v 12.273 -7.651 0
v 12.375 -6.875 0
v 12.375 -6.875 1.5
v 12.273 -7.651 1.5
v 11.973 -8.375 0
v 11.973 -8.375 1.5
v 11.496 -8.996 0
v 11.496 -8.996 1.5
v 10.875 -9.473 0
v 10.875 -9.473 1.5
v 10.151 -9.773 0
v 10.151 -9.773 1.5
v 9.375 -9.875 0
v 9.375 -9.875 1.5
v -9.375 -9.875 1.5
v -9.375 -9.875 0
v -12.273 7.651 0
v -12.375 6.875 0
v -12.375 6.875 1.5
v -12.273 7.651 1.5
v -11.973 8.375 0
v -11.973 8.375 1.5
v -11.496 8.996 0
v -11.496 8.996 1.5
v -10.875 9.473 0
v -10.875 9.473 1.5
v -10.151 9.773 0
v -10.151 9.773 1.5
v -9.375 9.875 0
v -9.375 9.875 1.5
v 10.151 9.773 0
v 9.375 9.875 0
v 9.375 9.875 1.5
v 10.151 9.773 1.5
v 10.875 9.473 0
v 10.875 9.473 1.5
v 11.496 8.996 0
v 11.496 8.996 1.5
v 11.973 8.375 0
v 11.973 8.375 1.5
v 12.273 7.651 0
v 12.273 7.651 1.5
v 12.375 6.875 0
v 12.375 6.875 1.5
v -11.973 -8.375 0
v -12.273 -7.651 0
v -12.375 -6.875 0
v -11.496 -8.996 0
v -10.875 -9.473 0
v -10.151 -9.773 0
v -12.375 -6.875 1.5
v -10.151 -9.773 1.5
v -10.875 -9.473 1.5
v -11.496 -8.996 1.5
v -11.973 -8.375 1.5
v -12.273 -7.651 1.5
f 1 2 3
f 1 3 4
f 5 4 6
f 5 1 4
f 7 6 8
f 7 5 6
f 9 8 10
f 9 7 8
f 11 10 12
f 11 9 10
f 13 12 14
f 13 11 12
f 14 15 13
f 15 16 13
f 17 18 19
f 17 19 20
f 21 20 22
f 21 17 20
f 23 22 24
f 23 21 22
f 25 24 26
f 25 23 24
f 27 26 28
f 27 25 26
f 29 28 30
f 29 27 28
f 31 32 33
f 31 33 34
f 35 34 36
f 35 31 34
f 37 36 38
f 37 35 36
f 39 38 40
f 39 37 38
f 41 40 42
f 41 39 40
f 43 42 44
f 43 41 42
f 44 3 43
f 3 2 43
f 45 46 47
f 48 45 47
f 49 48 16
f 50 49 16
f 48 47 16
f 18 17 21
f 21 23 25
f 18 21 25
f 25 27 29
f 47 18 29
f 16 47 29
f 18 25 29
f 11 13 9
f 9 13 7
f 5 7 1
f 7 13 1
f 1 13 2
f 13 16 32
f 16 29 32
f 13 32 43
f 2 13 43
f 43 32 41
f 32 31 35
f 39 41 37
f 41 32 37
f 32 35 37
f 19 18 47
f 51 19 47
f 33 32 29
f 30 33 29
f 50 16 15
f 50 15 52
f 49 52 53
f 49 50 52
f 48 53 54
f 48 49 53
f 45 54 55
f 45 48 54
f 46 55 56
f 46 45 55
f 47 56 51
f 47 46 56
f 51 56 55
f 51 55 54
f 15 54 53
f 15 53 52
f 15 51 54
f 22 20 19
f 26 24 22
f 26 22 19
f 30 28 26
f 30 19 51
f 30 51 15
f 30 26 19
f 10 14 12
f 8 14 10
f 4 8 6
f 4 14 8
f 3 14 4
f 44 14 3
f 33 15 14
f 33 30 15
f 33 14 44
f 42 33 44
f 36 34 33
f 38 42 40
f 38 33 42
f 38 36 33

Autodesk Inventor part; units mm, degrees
ref_plane "YZ Plane" through (0, 0, 0) normal (1, 0, 0) x (0, 1, 0)
ref_plane "XZ Plane" through (0, 0, 0) normal (0, 1, 0) x (-1, 0, 0)
ref_plane "XY Plane" through (0, 0, 0) normal (0, 0, 1) x (1, 0, 0)
sketch "Szkic1" plane through (0, 0, 0) normal (0, 0, 1) x (1, 0, 0)
  line L0 (-9.375, -9.875) -> (9.375, -9.875)
  line L1 (12.375, -6.875) -> (12.375, 6.875)
  line L2 (9.375, 9.875) -> (-9.375, 9.875)
  line L3 (-12.375, 6.875) -> (-12.375, -6.875)
  arc A0 (-9.375, 9.875) -> (-12.375, 6.875) centre (-9.375, 6.875) ccw
  arc A1 (12.375, 6.875) -> (9.375, 9.875) centre (9.375, 6.875) ccw
  arc A2 (9.375, -9.875) -> (12.375, -6.875) centre (9.375, -6.875) ccw
  arc A3 (-12.375, -6.875) -> (-9.375, -9.875) centre (-9.375, -6.875) ccw
  point P0 (0, 0)
  point P1 (12.375, 9.875)
  point P2 (12.375, -9.875)
  point P3 (-12.375, 9.875)
  dimension "d0" = 24.75
  dimension "d1" = 19.75
  dimension "d2" = 3
extrude "Wyciągnięcie proste1" add sketch "Szkic1" along normal blind 1.5
properties part number "PODUSZKA PODSTAWY" material "Kauczuk, silikon"
